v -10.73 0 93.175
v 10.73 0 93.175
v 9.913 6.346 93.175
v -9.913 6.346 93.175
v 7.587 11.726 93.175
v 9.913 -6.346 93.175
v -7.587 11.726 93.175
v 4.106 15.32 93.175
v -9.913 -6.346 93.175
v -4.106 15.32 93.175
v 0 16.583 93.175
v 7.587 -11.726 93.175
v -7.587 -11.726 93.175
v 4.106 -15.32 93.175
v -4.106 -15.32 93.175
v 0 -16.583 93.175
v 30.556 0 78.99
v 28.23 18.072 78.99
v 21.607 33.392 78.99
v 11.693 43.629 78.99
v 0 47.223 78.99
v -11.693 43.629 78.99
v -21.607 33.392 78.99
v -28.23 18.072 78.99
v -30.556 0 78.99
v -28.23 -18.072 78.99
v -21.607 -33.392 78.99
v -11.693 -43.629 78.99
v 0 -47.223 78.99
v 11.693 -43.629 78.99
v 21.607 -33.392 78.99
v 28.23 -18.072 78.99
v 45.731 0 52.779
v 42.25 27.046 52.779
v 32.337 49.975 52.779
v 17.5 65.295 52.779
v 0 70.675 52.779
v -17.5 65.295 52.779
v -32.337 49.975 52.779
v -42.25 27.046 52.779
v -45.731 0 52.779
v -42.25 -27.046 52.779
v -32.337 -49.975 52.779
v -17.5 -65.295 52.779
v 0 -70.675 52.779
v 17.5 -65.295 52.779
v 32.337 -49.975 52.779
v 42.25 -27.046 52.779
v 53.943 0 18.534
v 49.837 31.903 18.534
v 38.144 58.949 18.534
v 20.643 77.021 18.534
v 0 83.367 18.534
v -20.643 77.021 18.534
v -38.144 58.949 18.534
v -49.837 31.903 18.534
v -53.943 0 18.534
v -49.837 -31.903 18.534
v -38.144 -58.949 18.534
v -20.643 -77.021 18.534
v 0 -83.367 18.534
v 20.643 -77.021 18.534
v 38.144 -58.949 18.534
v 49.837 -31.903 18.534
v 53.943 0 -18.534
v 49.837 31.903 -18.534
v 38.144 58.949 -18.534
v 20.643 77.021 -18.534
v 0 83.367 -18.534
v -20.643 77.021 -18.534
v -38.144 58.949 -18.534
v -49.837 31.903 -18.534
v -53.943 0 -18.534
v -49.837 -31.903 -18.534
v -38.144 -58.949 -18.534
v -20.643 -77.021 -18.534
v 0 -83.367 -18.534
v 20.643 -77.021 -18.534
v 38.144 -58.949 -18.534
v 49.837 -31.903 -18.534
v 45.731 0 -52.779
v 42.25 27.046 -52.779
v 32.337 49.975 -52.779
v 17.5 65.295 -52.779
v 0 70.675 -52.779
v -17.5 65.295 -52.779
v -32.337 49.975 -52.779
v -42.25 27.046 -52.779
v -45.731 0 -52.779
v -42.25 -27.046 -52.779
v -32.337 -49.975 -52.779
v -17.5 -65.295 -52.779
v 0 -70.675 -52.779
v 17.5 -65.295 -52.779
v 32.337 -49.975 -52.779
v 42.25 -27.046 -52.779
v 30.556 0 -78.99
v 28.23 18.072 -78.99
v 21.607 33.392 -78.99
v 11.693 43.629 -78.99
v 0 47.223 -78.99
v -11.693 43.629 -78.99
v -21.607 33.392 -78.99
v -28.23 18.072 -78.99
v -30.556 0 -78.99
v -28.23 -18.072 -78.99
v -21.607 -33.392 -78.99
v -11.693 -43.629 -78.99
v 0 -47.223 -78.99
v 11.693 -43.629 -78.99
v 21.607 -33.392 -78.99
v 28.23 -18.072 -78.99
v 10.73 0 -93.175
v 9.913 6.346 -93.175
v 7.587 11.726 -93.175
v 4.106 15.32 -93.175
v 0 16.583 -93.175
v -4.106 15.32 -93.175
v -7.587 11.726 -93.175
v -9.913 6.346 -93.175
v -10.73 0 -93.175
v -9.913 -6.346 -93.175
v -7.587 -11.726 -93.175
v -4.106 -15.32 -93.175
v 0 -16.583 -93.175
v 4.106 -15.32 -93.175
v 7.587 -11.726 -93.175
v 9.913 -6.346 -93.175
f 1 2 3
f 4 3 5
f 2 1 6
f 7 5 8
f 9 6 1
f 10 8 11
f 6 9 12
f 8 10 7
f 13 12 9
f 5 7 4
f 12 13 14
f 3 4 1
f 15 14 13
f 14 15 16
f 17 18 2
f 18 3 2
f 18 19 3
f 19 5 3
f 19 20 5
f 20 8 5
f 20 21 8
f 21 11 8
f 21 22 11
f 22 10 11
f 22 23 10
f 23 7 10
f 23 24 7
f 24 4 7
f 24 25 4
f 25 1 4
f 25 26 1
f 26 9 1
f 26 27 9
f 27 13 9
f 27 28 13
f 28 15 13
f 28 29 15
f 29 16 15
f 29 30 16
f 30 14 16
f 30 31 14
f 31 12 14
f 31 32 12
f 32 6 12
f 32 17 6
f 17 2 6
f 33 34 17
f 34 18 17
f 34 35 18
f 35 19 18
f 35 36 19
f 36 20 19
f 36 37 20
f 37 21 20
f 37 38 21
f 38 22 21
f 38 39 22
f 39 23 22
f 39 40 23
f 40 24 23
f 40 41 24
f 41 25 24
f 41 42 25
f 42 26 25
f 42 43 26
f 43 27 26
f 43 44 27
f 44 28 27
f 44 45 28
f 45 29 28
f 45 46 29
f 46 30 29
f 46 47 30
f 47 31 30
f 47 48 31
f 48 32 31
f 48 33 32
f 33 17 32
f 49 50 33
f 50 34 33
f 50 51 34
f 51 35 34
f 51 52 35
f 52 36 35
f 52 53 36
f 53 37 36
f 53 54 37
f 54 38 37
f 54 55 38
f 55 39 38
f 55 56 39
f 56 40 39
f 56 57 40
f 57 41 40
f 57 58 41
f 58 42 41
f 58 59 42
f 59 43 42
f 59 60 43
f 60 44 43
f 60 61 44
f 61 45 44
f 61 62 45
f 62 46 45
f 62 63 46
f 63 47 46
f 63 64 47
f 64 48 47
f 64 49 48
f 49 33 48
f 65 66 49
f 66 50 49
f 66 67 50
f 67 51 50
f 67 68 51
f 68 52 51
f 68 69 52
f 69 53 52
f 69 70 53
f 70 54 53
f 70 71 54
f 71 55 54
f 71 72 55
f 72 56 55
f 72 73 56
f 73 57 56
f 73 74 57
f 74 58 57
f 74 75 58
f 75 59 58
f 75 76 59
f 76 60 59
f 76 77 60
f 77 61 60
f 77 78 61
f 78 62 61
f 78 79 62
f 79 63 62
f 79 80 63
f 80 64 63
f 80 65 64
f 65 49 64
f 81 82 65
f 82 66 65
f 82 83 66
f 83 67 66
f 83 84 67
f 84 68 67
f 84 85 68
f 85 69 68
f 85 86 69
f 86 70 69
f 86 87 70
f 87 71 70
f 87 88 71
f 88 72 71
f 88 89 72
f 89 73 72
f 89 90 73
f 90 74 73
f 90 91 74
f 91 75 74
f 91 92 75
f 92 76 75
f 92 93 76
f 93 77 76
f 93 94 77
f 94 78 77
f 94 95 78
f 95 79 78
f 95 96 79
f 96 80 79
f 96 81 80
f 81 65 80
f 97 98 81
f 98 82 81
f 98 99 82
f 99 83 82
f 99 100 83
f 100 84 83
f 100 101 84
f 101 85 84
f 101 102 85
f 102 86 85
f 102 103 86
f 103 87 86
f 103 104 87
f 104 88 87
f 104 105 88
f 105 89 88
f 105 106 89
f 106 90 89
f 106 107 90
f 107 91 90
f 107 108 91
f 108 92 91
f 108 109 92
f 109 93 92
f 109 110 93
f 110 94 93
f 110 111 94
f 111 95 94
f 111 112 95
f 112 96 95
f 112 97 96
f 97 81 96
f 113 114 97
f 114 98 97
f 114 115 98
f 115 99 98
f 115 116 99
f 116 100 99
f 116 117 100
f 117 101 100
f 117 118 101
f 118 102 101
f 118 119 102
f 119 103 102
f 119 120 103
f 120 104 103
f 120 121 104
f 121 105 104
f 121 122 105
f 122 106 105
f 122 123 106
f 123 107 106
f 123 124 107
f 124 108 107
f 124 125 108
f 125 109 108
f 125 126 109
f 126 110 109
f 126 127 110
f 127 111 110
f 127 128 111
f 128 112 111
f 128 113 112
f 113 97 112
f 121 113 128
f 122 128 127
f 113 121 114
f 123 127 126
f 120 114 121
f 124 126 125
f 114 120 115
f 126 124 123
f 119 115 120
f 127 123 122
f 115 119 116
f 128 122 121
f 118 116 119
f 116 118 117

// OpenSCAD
// Generated by SolidPython 1.0.1 on 2020-07-29 00:46:50


scale(v = [11, 17, 19]) {
	sphere(r = 5);
}
/***********************************************
*********      SolidPython code:      **********
************************************************
 
# import packages: SolidPython
from solid import *
from solid.utils import *
from itertools import chain, combinations, permutations


class Resize:

    def __init__(self, scad_file):
        self.scad_file = scad_file
        #self.scad_file = import_scad(scad_file)
        # cone/cylinder param:
        self.r1 = 0
        self.r2 = 0
        self.h = 0
        # rectangular prism param:
        self.w = 0
        self.l = 0
        # ellipse param:
        self.r = 0

    # import OpenScad code (file name corresponds to shape)


    # classify shape + parameters
    def assign(self, param1, param2, param3):
        if self.scad_file == 'cone.scad':
            self.r1 = param1
            self.r2 = param2
            self.h = param3
        elif self.scad_file == 'cylinder.scad':
            self.r1 = param1
            self.r2 = param2
            self.h = param3
        elif self.scad_file == 'rectangularPrism.scad':
            self.h = param1
            self.l = param2
            self.w = param3
        else:
            self.r = param1
            self.h = param2

    # resize parameters
    def iterate(self):
        x = range(3, 20, 2)
        i = 1
        if self.scad_file == 'cone.scad':
            tempList = list(permutations(x, 2))
            for temp in tempList:
                param1 = temp[0]
                param2 = temp[1]
                filepath = 'produced_scad_files/' + 'cone' + str(param1) + '_' + str(param2) + '_' + '.scad'
                scad_render_to_file(cylinder(h=param1, r1=param2, r2=0), filepath)

        elif self.scad_file == 'cylinder.scad':
            tempList = list(permutations(x, 3))
            for temp in tempList:
                param1 = temp[0]
                param2 = temp[1]
                filepath = 'produced_scad_files/' + 'cylinder' + str(param1) + '_' + str(param2) + '_' + '.scad'
                scad_render_to_file(cylinder(h=param1, r1=param2, r2=param2), filepath)

        elif self.scad_file == 'rectangularPrism.scad':
            tempList = list(permutations(x, 3))
            for temp in tempList:
                param1 = temp[0]
                param2 = temp[1]
                param3 = temp[2]
                filepath = 'produced_scad_files/' + 'rectangularPrism' + str(param1) + '_' + str(param2) + '_' + str(
                    param3) + '.scad'
                scad_render_to_file(cube(size=(param1, param2, param3)), filepath)

        elif self.scad_file == 'ellipse.scad':
            tempList = list(permutations(x, 4))
            for temp in tempList:
                param1 = temp[0]
                param2 = temp[1]
                param3 = temp[2]
                param4 = temp[3]
                filepath = 'produced_scad_files/' + 'ellipse' + str(param1) + '_' + str(param2) + '_' + str(param3) + '_' + str(param4) + '.scad'
                scad_render_to_file(scale([param1, param2, param3])(sphere(r=param4)), filepath)

    def render_to_scadfile(self):
        scad_render_to_file(scad, 'example.scad') 
 
************************************************/
